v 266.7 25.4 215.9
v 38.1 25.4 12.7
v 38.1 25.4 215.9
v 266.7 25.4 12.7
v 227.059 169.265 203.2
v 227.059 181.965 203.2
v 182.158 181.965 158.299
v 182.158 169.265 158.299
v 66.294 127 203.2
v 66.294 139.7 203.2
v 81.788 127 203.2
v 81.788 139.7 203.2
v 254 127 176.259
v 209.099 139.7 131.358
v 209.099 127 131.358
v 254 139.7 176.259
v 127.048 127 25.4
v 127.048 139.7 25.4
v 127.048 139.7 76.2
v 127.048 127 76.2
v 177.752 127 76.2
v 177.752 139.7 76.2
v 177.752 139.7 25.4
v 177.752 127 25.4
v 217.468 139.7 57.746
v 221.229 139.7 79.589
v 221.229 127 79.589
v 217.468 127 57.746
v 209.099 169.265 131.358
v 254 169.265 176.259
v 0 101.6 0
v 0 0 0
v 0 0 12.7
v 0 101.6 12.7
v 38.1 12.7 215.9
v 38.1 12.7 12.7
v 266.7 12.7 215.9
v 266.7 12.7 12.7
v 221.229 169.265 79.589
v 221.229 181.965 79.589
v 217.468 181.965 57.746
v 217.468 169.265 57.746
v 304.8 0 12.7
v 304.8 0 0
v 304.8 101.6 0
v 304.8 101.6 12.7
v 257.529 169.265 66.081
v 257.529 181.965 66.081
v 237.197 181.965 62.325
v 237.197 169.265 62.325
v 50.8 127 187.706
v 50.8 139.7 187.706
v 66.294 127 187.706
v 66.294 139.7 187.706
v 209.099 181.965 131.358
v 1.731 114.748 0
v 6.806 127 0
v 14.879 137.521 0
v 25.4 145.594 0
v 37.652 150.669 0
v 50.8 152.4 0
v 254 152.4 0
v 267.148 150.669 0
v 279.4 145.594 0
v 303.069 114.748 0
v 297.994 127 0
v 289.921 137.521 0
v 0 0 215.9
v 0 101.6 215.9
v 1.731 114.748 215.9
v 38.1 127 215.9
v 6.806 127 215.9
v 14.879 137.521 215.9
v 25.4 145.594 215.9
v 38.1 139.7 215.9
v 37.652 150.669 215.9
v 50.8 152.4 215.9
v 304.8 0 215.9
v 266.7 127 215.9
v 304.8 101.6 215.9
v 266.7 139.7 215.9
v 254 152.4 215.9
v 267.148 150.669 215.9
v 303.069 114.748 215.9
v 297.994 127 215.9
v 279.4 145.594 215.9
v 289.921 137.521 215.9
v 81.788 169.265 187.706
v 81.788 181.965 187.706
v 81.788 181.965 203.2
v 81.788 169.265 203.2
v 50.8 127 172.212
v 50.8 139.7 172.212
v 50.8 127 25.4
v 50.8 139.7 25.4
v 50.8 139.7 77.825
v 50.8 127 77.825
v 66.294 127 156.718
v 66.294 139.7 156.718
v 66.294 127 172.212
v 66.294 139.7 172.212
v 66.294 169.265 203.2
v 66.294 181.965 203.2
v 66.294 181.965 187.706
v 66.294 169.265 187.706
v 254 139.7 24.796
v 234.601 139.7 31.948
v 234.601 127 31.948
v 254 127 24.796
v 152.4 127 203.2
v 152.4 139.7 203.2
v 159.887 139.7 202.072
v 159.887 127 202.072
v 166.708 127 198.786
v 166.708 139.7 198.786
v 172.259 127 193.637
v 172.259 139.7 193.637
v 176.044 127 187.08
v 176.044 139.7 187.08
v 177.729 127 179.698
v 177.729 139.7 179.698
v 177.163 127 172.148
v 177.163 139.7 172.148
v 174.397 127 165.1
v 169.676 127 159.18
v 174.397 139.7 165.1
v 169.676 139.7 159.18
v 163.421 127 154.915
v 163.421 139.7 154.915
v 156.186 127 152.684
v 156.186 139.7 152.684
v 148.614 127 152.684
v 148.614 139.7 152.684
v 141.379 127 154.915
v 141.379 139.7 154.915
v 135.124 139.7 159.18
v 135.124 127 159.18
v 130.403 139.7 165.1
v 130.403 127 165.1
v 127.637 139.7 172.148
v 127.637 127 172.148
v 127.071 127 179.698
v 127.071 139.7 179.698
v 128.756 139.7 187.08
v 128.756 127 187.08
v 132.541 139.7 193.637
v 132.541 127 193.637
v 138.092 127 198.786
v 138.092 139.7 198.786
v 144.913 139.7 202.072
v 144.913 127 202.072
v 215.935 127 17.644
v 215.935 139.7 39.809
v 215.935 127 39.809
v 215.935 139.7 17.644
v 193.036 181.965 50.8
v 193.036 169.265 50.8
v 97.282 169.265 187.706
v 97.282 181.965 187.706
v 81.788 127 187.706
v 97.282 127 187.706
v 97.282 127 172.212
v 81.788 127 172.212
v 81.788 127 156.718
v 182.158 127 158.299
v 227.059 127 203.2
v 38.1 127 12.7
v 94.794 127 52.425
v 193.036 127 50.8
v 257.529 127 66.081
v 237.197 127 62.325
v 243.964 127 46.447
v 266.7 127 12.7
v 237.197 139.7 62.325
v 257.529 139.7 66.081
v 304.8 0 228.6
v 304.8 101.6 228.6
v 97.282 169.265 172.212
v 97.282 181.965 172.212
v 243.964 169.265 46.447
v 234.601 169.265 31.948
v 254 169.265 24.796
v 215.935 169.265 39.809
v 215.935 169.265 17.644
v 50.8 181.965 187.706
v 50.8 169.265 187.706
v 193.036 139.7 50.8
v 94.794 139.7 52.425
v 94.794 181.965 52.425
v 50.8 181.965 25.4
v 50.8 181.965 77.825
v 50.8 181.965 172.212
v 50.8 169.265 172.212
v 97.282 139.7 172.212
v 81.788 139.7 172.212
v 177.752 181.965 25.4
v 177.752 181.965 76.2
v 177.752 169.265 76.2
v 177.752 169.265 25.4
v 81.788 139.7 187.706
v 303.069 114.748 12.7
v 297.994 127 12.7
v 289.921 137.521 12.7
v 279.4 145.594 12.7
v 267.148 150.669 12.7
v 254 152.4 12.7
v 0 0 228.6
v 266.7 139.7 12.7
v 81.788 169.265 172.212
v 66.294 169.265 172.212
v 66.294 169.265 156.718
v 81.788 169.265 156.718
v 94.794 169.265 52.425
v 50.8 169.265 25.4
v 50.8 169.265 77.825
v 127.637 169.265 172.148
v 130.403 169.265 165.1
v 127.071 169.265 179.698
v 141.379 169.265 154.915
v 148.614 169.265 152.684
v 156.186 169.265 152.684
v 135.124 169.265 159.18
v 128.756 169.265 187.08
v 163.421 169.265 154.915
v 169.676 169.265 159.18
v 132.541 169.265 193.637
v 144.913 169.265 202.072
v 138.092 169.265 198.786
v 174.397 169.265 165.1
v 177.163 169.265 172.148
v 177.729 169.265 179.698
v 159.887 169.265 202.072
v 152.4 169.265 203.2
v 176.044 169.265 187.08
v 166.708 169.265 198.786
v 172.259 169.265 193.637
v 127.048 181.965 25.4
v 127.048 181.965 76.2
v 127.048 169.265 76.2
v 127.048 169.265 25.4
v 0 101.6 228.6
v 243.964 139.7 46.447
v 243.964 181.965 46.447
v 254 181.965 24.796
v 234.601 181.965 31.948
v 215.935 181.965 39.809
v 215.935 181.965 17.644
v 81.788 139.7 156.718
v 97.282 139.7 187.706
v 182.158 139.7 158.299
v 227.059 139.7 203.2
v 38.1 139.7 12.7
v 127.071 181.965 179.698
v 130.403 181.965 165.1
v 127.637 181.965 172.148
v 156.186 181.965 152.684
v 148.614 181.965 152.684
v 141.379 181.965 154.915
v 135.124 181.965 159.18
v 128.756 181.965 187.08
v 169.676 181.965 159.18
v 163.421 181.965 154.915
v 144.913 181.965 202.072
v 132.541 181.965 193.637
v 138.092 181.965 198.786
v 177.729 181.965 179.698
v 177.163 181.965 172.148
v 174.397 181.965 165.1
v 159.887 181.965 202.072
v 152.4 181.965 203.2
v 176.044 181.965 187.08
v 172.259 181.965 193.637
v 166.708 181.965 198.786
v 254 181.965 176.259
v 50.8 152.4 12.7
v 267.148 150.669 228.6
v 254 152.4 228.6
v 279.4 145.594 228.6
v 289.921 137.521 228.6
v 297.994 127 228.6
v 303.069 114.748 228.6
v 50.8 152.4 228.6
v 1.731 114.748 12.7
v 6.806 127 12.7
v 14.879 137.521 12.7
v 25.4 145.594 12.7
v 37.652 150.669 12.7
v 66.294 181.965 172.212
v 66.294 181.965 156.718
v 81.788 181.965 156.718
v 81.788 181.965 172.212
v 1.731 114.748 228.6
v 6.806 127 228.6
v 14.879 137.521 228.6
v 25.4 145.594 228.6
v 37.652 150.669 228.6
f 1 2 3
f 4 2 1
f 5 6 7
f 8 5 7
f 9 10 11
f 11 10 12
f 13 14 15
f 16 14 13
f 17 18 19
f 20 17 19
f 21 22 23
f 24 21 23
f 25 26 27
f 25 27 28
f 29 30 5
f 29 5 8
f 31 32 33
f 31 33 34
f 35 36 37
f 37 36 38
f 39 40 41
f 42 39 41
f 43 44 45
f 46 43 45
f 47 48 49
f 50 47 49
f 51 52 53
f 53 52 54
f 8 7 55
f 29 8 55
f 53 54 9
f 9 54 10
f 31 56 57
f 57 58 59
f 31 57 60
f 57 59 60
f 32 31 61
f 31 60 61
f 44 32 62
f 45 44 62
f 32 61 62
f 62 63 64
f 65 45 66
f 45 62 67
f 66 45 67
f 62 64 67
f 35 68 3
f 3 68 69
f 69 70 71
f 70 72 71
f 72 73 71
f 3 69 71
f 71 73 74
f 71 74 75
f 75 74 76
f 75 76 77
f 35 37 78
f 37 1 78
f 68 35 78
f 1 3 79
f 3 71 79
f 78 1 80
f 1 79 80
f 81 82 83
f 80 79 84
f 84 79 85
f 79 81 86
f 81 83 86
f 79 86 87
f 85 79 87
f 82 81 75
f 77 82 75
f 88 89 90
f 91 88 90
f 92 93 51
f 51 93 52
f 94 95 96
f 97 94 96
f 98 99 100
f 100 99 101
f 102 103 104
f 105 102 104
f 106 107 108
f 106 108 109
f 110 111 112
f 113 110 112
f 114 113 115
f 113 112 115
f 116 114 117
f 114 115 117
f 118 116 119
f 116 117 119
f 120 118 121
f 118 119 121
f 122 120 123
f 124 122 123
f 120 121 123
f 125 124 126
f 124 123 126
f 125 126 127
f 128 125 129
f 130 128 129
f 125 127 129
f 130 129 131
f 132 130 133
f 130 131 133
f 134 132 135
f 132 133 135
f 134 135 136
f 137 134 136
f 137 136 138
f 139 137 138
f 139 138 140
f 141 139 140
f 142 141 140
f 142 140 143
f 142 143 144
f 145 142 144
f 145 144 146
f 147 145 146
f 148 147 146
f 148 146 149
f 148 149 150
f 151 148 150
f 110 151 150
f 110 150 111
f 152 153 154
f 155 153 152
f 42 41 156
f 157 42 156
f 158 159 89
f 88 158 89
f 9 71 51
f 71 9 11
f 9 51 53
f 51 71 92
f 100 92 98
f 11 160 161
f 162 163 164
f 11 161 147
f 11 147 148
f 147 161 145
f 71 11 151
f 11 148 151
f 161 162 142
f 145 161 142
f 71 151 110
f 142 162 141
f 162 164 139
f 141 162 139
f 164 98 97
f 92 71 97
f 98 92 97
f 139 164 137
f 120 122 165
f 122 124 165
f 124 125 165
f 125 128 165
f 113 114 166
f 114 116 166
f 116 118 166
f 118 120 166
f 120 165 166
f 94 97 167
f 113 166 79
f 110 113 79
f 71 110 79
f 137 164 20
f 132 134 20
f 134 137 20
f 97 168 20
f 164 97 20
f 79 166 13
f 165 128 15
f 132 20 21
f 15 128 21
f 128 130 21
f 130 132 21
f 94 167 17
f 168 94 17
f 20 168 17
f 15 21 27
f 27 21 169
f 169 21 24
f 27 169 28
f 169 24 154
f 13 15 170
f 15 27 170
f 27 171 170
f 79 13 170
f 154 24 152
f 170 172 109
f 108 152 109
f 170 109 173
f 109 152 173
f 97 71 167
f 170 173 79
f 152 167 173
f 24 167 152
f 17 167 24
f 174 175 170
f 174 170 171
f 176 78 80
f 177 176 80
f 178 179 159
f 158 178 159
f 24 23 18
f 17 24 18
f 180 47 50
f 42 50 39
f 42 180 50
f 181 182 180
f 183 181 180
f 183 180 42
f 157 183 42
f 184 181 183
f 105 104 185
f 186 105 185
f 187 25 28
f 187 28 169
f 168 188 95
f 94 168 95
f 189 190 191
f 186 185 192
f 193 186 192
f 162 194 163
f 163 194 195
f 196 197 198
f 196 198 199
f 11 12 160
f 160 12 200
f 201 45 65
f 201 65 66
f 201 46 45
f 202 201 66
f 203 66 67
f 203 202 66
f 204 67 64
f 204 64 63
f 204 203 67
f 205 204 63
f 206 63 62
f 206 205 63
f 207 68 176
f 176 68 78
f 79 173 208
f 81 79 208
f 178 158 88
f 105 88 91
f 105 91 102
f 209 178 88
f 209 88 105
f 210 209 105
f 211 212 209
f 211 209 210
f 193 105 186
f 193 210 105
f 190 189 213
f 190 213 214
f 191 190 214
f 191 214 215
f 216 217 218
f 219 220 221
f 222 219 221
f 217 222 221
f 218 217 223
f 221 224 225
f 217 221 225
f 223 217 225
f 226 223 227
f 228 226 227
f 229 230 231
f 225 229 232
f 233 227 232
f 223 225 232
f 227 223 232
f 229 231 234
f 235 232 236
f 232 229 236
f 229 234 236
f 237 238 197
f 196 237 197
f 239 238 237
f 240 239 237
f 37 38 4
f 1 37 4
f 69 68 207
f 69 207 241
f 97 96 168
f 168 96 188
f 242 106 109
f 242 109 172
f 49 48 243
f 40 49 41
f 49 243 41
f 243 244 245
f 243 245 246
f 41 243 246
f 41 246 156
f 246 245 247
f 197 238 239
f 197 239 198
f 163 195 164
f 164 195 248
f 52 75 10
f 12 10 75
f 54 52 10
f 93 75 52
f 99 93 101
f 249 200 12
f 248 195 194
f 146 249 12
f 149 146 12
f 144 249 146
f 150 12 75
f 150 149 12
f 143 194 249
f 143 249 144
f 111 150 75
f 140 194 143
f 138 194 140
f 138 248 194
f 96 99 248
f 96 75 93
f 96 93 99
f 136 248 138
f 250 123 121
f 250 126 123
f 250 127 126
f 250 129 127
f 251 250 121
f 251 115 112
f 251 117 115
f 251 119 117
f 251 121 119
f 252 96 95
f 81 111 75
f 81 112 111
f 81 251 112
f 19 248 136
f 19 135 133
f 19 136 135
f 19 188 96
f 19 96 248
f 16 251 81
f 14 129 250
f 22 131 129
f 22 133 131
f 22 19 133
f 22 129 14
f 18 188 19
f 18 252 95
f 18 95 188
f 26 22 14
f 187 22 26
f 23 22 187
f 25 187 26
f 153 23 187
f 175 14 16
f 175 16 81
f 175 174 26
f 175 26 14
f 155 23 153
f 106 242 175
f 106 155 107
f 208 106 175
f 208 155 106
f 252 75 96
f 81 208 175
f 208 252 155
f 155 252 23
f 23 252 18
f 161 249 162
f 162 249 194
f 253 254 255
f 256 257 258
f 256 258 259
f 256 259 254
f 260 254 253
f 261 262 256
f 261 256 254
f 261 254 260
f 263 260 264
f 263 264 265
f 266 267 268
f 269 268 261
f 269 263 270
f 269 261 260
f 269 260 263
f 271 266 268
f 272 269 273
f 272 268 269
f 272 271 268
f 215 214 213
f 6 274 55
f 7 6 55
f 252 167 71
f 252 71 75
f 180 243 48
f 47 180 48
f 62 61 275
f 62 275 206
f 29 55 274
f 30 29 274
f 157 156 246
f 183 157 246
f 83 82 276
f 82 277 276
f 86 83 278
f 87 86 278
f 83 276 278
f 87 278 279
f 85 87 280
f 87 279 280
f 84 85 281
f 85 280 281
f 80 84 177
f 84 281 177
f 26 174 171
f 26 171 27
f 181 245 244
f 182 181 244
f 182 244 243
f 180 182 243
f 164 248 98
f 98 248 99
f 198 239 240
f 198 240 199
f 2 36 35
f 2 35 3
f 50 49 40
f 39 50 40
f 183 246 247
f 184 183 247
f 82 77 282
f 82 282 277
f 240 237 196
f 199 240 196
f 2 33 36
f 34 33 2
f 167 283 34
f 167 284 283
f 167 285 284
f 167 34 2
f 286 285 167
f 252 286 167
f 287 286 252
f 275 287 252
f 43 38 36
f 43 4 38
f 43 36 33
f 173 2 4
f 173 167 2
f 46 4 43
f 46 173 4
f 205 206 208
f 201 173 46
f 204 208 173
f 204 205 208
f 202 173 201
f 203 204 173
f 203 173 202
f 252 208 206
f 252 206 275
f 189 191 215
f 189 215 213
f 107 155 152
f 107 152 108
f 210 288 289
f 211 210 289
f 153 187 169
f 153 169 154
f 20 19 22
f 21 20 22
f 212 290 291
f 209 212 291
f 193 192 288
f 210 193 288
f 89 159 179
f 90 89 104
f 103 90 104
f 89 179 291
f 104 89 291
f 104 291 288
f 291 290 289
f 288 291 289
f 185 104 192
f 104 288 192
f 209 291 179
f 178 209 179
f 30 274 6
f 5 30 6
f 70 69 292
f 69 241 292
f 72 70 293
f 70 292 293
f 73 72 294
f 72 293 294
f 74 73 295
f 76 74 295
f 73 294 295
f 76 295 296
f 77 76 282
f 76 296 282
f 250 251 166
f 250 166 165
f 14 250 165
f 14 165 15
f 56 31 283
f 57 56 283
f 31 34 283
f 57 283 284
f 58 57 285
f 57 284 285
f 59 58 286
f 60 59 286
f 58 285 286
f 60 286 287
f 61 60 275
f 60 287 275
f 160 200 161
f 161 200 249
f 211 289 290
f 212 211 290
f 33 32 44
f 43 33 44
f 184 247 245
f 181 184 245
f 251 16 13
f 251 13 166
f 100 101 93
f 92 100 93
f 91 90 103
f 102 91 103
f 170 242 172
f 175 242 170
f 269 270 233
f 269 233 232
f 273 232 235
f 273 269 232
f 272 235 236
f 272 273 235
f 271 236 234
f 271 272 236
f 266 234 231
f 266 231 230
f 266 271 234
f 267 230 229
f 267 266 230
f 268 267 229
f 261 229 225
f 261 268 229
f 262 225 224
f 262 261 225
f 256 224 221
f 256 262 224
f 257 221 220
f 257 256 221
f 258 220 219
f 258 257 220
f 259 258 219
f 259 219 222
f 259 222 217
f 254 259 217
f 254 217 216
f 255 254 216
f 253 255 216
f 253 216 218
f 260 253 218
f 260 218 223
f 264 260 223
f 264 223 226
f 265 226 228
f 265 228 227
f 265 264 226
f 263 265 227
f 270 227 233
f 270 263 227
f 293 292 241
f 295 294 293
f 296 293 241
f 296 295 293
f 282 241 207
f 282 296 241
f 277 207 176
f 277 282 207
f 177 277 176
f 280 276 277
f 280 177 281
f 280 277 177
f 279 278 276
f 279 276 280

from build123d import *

# Parameters (mm, degrees)
SKETCH1_W             = 304.8
SKETCH1_H             = 152.4
BOSS_EXTRUDE1_DEPTH   = 12.7
FILLET3_R             = 50.8
SKETCH2_W             = 228.6
SKETCH2_H             = 12.7
BOSS_EXTRUDE2_DEPTH   = 203.2
SKETCH3_W             = 304.8
SKETCH3_H             = 152.4
BOSS_EXTRUDE3_DEPTH   = 12.7
FILLET4_R             = 50.8
SKETCH5_W             = 228.6
SKETCH5_H             = 12.7
BOSS_EXTRUDE5_DEPTH   = 203.2
SKETCH6_R             = 25.4
CUT_EXTRUDE1_DEPTH    = 50.8
CUT_EXTRUDE2_DEPTH    = 50.8
CUT_EXTRUDE3_DEPTH    = 50.8
CUT_EXTRUDE5_DEPTH    = 50.8
CUT_EXTRUDE7_DEPTH    = 50.8
BOSS_EXTRUDE9_START   = 12.7
SKETCH17_R            = 25.4
BOSS_EXTRUDE9_DEPTH   = 12.7
BOSS_EXTRUDE9_2_DEPTH = 12.7
BOSS_EXTRUDE9_3_DEPTH = 12.7
BOSS_EXTRUDE9_4_DEPTH = 12.7
SKETCH17_W            = 50.70474023
SKETCH17_H            = 50.8
BOSS_EXTRUDE9_5_DEPTH = 12.7
BOSS_EXTRUDE9_6_DEPTH = 12.7


with BuildPart() as part:
    # Sketch1 → Boss-Extrude1 (new body)
    with BuildSketch(Plane.XY):
        with Locations((152.4, 76.2)):
            Rectangle(SKETCH1_W, SKETCH1_H)
    extrude(amount=BOSS_EXTRUDE1_DEPTH)

    # Fillet3
    fillet3_edges = [part.edges().sort_by_distance(p)[0] for p in [
        (0, 152.4, 6.35),
        (304.8, 152.4, 6.35),
    ]]
    fillet(fillet3_edges, radius=FILLET3_R)

    # Sketch2 → Boss-Extrude2 (add)
    with BuildSketch(Plane.XY.offset(12.7)):
        with Locations((152.4, 133.35)):
            Rectangle(SKETCH2_W, SKETCH2_H)
    extrude(amount=BOSS_EXTRUDE2_DEPTH)

    # Sketch3 → Boss-Extrude3 (add)
    with BuildSketch(Plane.XY.offset(215.9)):
        with Locations((152.4, 76.2)):
            Rectangle(SKETCH3_W, SKETCH3_H)
    extrude(amount=BOSS_EXTRUDE3_DEPTH)

    # Fillet4
    fillet4_edges = [part.edges().sort_by_distance(p)[0] for p in [
        (0, 152.4, 222.25),
        (304.8, 152.4, 222.25),
    ]]
    fillet(fillet4_edges, radius=FILLET4_R)

    # Sketch5 → Boss-Extrude5 (add)
    with BuildSketch(Plane.XY.offset(12.7)):
        with Locations((152.4, 19.05)):
            Rectangle(SKETCH5_W, SKETCH5_H)
    extrude(amount=BOSS_EXTRUDE5_DEPTH)

    # Sketch6 → Cut-Extrude1 (cut)
    with BuildSketch(Plane(origin=(0, 139.7, 0), x_dir=(1, 0, 0), z_dir=(0, 1, 0))):
        with Locations(Location((152.4, -177.8, 0), (0, 0, 270))):
            Circle(SKETCH6_R)
        Polygon((127.047629885, -25.4), (127.047629885, -76.2), (152.4, -76.2), (177.752370115, -76.2), (177.752370115, -50.8), (177.752370115, -25.4), align=None)
    extrude(amount=-CUT_EXTRUDE1_DEPTH, mode=Mode.SUBTRACT)

    # Sketch7 → Cut-Extrude2 (cut)
    with BuildSketch(Plane(origin=(0, 139.7, 0), x_dir=(1, 0, 0), z_dir=(0, 1, 0))):
        Polygon((50.8, -25.4), (50.8, -77.824929978), (94.794090512, -52.424929978), align=None)
    extrude(amount=-CUT_EXTRUDE2_DEPTH, mode=Mode.SUBTRACT)

    # Sketch8 → Cut-Extrude3 (cut)
    with BuildSketch(Plane(origin=(0, 139.7, 0), x_dir=(1, 0, 0), z_dir=(0, 1, 0))):
        Polygon((66.294, -156.718), (66.294, -172.212), (50.8, -172.212), (50.8, -187.706), (66.294, -187.706), (66.294, -203.2), (81.788, -203.2), (81.788, -187.706), (97.282, -187.706), (97.282, -172.212), (81.788, -172.212), (81.788, -156.718), align=None)
    extrude(amount=-CUT_EXTRUDE3_DEPTH, mode=Mode.SUBTRACT)

    # Sketch10 → Cut-Extrude5 (cut)
    with BuildSketch(Plane(origin=(0, 139.7, 0), x_dir=(1, 0, 0), z_dir=(0, 1, 0))):
        Polygon((254, -176.259231637), (227.059231637, -203.2), (182.157951031, -158.298719395), (209.098719395, -131.357951031), align=None)
    extrude(amount=-CUT_EXTRUDE5_DEPTH, mode=Mode.SUBTRACT)

    # Sketch11 → Cut-Extrude7 (cut)
    with BuildSketch(Plane(origin=(0, 139.7, 0), x_dir=(1, 0, 0), z_dir=(0, 1, 0))):
        Polygon((193.03591652, -50.8), (243.964438371, -46.447008303), (257.528748086, -66.08101348), (237.196986142, -62.324961711), (221.229311995, -79.589137786), (217.467804029, -57.745708944), align=None)
        Polygon((254, -24.795861449), (243.964438371, -46.447008303), (193.03591652, -50.8), (215.934691813, -39.808817622), (215.934691813, -17.643883024), (234.600575441, -31.947839874), align=None)
    extrude(amount=-CUT_EXTRUDE7_DEPTH, mode=Mode.SUBTRACT)


with BuildPart() as body_2:
    # Sketch17 → Boss-Extrude9 (new body)
    with BuildSketch(Plane(origin=(0, 169.265167748, 0), x_dir=(1, 0, 0), z_dir=(0, 1, 0)).offset(BOSS_EXTRUDE9_START)):
        with Locations(Location((152.4, -177.8, 0), (0, 0, 270))):
            Circle(SKETCH17_R)
    extrude(amount=-BOSS_EXTRUDE9_DEPTH)


with BuildPart() as body_3:
    # Sketch17 → Boss-Extrude9 2 (new body)
    with BuildSketch(Plane(origin=(0, 169.265167748, 0), x_dir=(1, 0, 0), z_dir=(0, 1, 0)).offset(BOSS_EXTRUDE9_START)):
        Polygon((50.8, -25.4), (50.8, -77.824929978), (94.794090512, -52.424929978), align=None)
    extrude(amount=-BOSS_EXTRUDE9_2_DEPTH)


with BuildPart() as body_4:
    # Sketch17 → Boss-Extrude9 3 (new body)
    with BuildSketch(Plane(origin=(0, 169.265167748, 0), x_dir=(1, 0, 0), z_dir=(0, 1, 0)).offset(BOSS_EXTRUDE9_START)):
        Polygon((66.294, -156.718), (81.788, -156.718), (81.788, -172.212), (97.282, -172.212), (97.282, -187.706), (81.788, -187.706), (81.788, -203.2), (66.294, -203.2), (66.294, -187.706), (50.8, -187.706), (50.8, -172.212), (66.294, -172.212), align=None)
    extrude(amount=-BOSS_EXTRUDE9_3_DEPTH)


with BuildPart() as body_5:
    # Sketch17 → Boss-Extrude9 4 (new body)
    with BuildSketch(Plane(origin=(0, 169.265167748, 0), x_dir=(1, 0, 0), z_dir=(0, 1, 0)).offset(BOSS_EXTRUDE9_START)):
        Polygon((182.157951031, -158.298719395), (209.098719395, -131.357951031), (254, -176.259231637), (227.059231637, -203.2), align=None)
    extrude(amount=-BOSS_EXTRUDE9_4_DEPTH)


with BuildPart() as body_6:
    # Sketch17 → Boss-Extrude9 5 (new body)
    with BuildSketch(Plane(origin=(0, 169.265167748, 0), x_dir=(1, 0, 0), z_dir=(0, 1, 0)).offset(BOSS_EXTRUDE9_START)):
        with Locations((152.4, -50.8)):
            Rectangle(SKETCH17_W, SKETCH17_H)
    extrude(amount=-BOSS_EXTRUDE9_5_DEPTH)


with BuildPart() as body_7:
    # Sketch17 → Boss-Extrude9 6 (new body)
    with BuildSketch(Plane(origin=(0, 169.265167748, 0), x_dir=(1, 0, 0), z_dir=(0, 1, 0)).offset(BOSS_EXTRUDE9_START)):
        Polygon((193.03591652, -50.8), (215.934691813, -39.808817622), (215.934691813, -17.643883024), (234.600575441, -31.947839874), (254, -24.795861449), (243.964438371, -46.447008303), (257.528748086, -66.08101348), (237.196986142, -62.324961711), (221.229311995, -79.589137786), (217.467804029, -57.745708944), align=None)
    extrude(amount=-BOSS_EXTRUDE9_6_DEPTH)


solid = Compound([part.part, body_2.part, body_3.part, body_4.part, body_5.part, body_6.part, body_7.part])
